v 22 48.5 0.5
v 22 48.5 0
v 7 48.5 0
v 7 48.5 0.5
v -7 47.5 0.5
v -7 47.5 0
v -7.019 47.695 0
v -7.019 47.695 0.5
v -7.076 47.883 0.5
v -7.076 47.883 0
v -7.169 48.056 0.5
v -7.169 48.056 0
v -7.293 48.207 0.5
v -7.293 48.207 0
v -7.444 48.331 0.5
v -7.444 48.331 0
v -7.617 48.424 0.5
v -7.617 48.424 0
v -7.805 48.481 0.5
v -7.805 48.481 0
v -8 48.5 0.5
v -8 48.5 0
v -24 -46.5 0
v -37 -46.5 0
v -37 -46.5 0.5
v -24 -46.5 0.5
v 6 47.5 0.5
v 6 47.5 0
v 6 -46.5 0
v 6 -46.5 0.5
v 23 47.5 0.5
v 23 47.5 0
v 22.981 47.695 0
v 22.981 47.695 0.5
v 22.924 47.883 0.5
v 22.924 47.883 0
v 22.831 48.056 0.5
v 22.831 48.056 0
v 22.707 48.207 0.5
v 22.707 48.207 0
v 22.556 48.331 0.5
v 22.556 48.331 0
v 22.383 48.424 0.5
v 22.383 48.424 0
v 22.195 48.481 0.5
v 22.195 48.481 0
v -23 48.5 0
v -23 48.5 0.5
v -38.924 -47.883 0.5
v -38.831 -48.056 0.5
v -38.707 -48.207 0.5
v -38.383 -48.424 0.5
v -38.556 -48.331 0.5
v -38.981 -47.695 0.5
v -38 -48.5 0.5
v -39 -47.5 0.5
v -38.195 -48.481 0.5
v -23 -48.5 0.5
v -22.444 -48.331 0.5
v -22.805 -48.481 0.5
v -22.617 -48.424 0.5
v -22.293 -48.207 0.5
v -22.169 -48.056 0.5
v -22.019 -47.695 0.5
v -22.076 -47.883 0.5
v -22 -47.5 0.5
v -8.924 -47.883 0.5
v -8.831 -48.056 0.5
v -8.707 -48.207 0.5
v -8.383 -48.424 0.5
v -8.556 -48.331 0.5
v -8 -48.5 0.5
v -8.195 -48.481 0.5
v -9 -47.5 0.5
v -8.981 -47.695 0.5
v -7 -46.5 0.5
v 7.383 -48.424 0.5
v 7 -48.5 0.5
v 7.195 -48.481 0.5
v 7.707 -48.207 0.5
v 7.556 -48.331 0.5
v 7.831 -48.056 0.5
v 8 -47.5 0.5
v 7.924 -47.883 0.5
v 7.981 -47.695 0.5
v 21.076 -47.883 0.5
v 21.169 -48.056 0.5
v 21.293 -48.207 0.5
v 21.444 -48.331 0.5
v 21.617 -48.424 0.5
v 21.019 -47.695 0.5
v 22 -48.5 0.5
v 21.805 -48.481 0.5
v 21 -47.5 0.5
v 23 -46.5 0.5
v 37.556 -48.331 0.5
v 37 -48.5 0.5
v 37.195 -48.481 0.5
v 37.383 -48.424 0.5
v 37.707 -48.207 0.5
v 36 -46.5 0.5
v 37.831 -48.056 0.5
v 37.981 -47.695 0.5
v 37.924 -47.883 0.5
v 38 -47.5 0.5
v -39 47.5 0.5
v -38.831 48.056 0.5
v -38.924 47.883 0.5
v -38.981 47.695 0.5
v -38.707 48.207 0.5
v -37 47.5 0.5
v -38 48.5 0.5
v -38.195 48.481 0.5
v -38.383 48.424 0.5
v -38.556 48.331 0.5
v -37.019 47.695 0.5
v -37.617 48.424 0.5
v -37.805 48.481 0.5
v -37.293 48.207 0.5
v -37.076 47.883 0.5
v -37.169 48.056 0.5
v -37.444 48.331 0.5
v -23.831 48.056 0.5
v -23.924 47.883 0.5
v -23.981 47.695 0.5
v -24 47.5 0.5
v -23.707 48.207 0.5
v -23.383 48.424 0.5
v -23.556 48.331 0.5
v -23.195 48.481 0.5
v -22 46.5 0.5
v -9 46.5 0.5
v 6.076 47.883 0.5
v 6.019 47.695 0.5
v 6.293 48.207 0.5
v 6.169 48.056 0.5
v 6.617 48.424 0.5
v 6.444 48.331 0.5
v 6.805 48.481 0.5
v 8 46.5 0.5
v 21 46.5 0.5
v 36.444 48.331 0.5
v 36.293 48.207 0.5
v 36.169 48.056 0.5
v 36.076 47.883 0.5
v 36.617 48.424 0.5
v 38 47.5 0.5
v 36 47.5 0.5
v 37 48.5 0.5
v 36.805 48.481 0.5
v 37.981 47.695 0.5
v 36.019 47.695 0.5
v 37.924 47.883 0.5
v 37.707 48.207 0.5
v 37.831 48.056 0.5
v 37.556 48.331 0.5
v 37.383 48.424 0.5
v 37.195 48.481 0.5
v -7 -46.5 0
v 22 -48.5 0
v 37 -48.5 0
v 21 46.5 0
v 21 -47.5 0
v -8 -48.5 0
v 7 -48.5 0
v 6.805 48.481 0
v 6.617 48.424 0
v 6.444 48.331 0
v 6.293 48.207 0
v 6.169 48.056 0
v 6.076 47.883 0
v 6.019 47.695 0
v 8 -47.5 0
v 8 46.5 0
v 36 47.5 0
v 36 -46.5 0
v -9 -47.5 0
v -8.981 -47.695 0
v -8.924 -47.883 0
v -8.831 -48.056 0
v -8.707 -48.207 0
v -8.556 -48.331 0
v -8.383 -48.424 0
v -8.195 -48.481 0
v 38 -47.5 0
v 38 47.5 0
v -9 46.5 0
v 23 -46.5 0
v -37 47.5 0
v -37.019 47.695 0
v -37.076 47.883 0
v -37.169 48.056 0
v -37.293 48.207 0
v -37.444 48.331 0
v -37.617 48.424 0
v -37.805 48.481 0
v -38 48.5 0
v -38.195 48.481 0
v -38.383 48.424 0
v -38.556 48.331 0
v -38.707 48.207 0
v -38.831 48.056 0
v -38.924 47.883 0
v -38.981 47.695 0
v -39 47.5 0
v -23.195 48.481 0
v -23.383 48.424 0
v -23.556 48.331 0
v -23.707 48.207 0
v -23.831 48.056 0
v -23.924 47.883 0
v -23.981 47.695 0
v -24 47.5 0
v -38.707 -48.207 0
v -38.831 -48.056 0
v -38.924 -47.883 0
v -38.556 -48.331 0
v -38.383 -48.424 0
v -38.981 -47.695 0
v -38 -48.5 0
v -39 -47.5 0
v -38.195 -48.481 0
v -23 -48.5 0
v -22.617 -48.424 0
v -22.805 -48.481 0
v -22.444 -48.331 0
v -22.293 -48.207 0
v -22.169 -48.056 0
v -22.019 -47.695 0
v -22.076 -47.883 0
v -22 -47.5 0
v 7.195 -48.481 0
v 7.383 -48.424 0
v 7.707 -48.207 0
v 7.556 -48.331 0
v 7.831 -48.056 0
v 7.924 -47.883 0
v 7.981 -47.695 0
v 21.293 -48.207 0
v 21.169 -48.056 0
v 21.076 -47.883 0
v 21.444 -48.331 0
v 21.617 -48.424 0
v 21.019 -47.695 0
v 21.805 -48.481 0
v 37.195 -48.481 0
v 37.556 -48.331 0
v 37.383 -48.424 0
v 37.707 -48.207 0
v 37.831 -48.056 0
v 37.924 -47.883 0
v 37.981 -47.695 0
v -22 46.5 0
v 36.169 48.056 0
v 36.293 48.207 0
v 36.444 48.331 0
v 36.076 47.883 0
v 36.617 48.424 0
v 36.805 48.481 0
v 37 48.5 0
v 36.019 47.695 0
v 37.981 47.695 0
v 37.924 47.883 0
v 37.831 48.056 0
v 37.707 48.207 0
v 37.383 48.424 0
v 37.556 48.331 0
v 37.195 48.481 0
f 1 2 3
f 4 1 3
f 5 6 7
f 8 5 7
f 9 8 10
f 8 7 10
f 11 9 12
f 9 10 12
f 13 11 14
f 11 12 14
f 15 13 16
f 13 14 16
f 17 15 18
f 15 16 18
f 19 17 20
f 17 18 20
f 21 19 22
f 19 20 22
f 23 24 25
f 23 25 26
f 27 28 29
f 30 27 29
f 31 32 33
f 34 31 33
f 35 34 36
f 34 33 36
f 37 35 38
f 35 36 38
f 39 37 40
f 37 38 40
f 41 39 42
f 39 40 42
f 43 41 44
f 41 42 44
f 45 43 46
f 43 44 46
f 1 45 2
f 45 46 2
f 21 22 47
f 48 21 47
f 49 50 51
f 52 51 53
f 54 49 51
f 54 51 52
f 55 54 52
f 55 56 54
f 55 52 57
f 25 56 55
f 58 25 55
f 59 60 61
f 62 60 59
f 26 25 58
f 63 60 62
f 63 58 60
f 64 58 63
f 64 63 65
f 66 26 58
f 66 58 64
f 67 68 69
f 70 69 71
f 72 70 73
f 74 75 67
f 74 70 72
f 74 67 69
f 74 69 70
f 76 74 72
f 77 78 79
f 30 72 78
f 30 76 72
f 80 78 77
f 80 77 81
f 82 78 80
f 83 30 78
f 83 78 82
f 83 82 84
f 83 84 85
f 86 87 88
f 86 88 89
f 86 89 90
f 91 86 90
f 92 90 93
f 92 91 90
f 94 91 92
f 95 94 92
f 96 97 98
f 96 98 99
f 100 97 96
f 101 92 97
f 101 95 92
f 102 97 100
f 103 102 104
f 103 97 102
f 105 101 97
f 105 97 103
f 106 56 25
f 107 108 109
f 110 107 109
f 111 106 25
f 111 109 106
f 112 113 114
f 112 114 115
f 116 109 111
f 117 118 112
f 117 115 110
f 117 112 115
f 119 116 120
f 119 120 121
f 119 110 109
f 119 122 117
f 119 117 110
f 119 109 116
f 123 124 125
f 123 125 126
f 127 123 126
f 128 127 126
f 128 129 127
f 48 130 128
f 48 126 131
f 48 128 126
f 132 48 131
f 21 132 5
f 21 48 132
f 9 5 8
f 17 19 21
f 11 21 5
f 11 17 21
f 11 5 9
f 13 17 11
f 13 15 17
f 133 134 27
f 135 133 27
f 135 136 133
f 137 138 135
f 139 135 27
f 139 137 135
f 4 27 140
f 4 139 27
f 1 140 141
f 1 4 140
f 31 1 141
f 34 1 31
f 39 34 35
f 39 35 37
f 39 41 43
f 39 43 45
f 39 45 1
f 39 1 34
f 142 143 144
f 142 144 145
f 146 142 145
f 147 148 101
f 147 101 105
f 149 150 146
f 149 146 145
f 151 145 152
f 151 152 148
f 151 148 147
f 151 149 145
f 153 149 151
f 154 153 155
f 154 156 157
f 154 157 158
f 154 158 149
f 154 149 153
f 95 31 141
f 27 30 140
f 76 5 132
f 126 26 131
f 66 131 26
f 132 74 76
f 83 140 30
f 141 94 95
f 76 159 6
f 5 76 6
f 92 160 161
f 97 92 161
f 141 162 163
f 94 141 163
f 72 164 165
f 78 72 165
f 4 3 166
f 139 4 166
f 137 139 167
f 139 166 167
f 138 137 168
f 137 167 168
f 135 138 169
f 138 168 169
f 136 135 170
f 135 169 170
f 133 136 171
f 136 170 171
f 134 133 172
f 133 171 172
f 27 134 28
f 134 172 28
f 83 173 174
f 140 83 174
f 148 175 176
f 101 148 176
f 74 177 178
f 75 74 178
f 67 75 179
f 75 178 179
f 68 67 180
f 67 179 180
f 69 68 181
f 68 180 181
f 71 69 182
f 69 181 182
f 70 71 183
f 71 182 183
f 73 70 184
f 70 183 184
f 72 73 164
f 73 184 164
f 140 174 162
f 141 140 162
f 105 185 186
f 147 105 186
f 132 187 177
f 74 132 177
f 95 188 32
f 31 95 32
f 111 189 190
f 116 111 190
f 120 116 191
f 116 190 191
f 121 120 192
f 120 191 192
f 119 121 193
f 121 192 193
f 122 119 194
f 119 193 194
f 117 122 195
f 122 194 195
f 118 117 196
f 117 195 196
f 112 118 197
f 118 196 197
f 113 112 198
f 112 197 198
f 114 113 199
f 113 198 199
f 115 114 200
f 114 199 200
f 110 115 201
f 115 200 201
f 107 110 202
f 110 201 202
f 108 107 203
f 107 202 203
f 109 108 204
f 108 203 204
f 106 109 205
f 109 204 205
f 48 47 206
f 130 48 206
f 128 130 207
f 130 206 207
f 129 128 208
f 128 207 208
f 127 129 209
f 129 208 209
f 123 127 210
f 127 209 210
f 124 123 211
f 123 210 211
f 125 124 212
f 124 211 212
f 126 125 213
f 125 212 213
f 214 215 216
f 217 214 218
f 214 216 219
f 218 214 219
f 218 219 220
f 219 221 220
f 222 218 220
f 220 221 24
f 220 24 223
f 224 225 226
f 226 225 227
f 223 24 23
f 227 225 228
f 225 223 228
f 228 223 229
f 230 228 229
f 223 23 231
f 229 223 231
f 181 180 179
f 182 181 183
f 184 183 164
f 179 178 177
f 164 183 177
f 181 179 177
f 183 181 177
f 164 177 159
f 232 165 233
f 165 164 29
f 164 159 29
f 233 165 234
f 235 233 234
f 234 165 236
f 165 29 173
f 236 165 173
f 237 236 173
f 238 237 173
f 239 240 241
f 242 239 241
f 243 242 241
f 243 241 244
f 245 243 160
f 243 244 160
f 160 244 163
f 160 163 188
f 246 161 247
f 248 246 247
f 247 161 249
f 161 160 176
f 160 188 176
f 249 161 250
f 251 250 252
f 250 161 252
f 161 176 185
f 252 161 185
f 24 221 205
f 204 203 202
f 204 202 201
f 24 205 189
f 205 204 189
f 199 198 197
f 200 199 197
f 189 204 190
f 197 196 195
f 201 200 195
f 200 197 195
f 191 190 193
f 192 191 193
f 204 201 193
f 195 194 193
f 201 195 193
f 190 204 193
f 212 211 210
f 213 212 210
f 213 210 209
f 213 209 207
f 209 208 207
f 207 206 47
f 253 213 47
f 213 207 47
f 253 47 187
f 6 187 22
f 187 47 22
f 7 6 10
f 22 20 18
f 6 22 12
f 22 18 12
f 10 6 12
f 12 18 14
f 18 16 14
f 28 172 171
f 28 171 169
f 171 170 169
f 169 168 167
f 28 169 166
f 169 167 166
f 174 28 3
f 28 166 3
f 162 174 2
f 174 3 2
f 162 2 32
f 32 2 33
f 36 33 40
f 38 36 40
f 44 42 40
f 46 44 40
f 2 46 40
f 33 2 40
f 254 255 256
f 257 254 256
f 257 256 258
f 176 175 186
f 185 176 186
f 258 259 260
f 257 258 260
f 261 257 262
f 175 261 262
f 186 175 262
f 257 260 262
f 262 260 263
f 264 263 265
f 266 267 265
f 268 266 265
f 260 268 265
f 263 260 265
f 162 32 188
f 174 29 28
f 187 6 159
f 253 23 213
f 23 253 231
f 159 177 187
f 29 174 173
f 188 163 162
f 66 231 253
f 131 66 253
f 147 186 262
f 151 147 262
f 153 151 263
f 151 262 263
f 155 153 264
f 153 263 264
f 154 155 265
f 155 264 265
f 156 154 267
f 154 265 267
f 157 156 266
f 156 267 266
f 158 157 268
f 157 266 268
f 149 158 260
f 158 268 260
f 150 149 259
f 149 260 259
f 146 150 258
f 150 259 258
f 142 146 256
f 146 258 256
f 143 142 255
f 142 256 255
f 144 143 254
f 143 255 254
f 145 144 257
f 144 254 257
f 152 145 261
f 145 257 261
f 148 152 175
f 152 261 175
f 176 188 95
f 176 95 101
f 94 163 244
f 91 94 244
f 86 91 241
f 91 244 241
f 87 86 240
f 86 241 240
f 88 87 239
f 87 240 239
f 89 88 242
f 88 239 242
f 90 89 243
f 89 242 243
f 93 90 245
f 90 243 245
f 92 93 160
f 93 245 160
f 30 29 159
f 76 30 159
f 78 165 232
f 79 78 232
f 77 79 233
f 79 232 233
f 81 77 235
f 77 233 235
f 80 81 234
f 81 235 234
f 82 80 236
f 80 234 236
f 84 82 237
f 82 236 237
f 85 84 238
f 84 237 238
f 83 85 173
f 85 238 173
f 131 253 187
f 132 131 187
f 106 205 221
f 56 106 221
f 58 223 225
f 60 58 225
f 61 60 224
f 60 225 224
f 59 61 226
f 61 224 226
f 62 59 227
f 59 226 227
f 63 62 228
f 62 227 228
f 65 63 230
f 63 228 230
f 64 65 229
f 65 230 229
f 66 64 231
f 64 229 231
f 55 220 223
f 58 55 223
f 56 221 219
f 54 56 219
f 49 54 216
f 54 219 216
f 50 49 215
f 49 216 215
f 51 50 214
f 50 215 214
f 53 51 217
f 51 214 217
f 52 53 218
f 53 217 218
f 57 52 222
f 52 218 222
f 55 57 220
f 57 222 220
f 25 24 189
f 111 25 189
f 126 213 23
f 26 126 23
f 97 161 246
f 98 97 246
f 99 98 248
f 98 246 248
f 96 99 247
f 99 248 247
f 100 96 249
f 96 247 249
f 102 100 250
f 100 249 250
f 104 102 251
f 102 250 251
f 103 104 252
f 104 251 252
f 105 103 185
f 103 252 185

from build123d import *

# Parameters (mm, degrees)
F1_W     = 1
F1_H     = 1
F1_W_2   = 13
F2_DEPTH = 0.5


with BuildPart() as f2:
    # F1 (on Top) → F2 (new body)
    with BuildSketch(Plane.XY):
        with BuildLine():
            ThreePointArc((38, -47.5), (37.7071067812, -46.7928932188), (37, -46.5))
            Line((37, -46.5), (37, -47.5))
            Line((37, -47.5), (36, -47.5))
            ThreePointArc((36, -47.5), (36.2928932188, -48.2071067812), (37, -48.5))
            ThreePointArc((37, -48.5), (37.7071067812, -48.2071067812), (38, -47.5))
        make_face()
        with BuildLine():
            Line((36, -46.5), (37, -46.5))
            ThreePointArc((37, -46.5), (37.7071067812, -46.7928932188), (38, -47.5))
            Line((38, -47.5), (38, 47.5))
            ThreePointArc((38, 47.5), (37, 48.5), (36, 47.5))
            Line((36, 47.5), (36, -46.5))
        make_face()
        with Locations((36.5, -47)):
            Rectangle(F1_W, F1_H)
        with Locations((29.5, -47)):
            Rectangle(F1_W_2, F1_H)
        with BuildLine():
            ThreePointArc((37, -48.5), (36.2928932188, -48.2071067812), (36, -47.5))
            Line((36, -47.5), (23, -47.5))
            ThreePointArc((23, -47.5), (22.7071067812, -48.2071067812), (22, -48.5))
            Line((22, -48.5), (37, -48.5))
        make_face()
        with BuildLine():
            Line((22, -46.5), (23, -46.5))
            Line((23, -46.5), (23, 47.5))
            ThreePointArc((23, 47.5), (22.7071067812, 46.7928932188), (22, 46.5))
            Line((22, 46.5), (22, -46.5))
        make_face()
        with Locations((22.5, -47)):
            Rectangle(F1_W, F1_H)
        with BuildLine():
            ThreePointArc((22, -48.5), (22.7071067812, -48.2071067812), (23, -47.5))
            Line((23, -47.5), (22, -47.5))
            Line((22, -47.5), (22, -46.5))
            ThreePointArc((22, -46.5), (21.2928932188, -46.7928932188), (21, -47.5))
            ThreePointArc((21, -47.5), (21.2928932188, -48.2071067812), (22, -48.5))
        make_face()
        with BuildLine():
            ThreePointArc((22, 46.5), (22.7071067812, 46.7928932188), (23, 47.5))
            ThreePointArc((23, 47.5), (22.7071067812, 48.2071067812), (22, 48.5))
            ThreePointArc((22, 48.5), (21.2928932188, 48.2071067812), (21, 47.5))
            Line((21, 47.5), (22, 47.5))
            Line((22, 47.5), (22, 46.5))
        make_face()
        with BuildLine():
            ThreePointArc((21, -47.5), (21.2928932188, -46.7928932188), (22, -46.5))
            Line((22, -46.5), (22, 46.5))
            Line((22, 46.5), (21, 46.5))
            Line((21, 46.5), (21, -47.5))
        make_face()
        with BuildLine():
            ThreePointArc((21, 47.5), (21.2928932188, 48.2071067812), (22, 48.5))
            Line((22, 48.5), (7, 48.5))
            ThreePointArc((7, 48.5), (7.7071067812, 48.2071067812), (8, 47.5))
            Line((8, 47.5), (21, 47.5))
        make_face()
        with Locations((21.5, 47)):
            Rectangle(F1_W, F1_H)
        with Locations((14.5, 47)):
            Rectangle(F1_W_2, F1_H)
        with BuildLine():
            ThreePointArc((8, 47.5), (7.7071067812, 48.2071067812), (7, 48.5))
            ThreePointArc((7, 48.5), (6.2928932188, 48.2071067812), (6, 47.5))
            ThreePointArc((6, 47.5), (6.2928932188, 46.7928932188), (7, 46.5))
            Line((7, 46.5), (7, 47.5))
            Line((7, 47.5), (8, 47.5))
        make_face()
        with BuildLine():
            Line((8, -47.5), (8, 46.5))
            Line((8, 46.5), (7, 46.5))
            Line((7, 46.5), (7, -46.5))
            ThreePointArc((7, -46.5), (7.7071067812, -46.7928932188), (8, -47.5))
        make_face()
        with Locations((7.5, 47)):
            Rectangle(F1_W, F1_H)
        with BuildLine():
            ThreePointArc((7, 46.5), (6.2928932188, 46.7928932188), (6, 47.5))
            Line((6, 47.5), (6, -46.5))
            Line((6, -46.5), (7, -46.5))
            Line((7, -46.5), (7, 46.5))
        make_face()
        with BuildLine():
            ThreePointArc((7, -48.5), (7.7071067812, -48.2071067812), (8, -47.5))
            ThreePointArc((8, -47.5), (7.7071067812, -46.7928932188), (7, -46.5))
            Line((7, -46.5), (7, -47.5))
            Line((7, -47.5), (6, -47.5))
            ThreePointArc((6, -47.5), (6.2928932188, -48.2071067812), (7, -48.5))
        make_face()
        with Locations((6.5, -47)):
            Rectangle(F1_W, F1_H)
        with Locations((-0.5, -47)):
            Rectangle(F1_W_2, F1_H)
        with BuildLine():
            Line((-8, -48.5), (7, -48.5))
            ThreePointArc((7, -48.5), (6.2928932188, -48.2071067812), (6, -47.5))
            Line((6, -47.5), (-7, -47.5))
            ThreePointArc((-7, -47.5), (-7.2928932188, -48.2071067812), (-8, -48.5))
        make_face()
        with Locations((-7.5, -47)):
            Rectangle(F1_W, F1_H)
        with BuildLine():
            Line((-8, -46.5), (-7, -46.5))
            Line((-7, -46.5), (-7, 47.5))
            ThreePointArc((-7, 47.5), (-7.2928932188, 46.7928932188), (-8, 46.5))
            Line((-8, 46.5), (-8, -46.5))
        make_face()
        with BuildLine():
            ThreePointArc((-9, -47.5), (-8.7071067812, -48.2071067812), (-8, -48.5))
            ThreePointArc((-8, -48.5), (-7.2928932188, -48.2071067812), (-7, -47.5))
            Line((-7, -47.5), (-8, -47.5))
            Line((-8, -47.5), (-8, -46.5))
            ThreePointArc((-8, -46.5), (-8.7071067812, -46.7928932188), (-9, -47.5))
        make_face()
        with BuildLine():
            ThreePointArc((-9, -47.5), (-8.7071067812, -46.7928932188), (-8, -46.5))
            Line((-8, -46.5), (-8, 46.5))
            Line((-8, 46.5), (-9, 46.5))
            Line((-9, 46.5), (-9, -47.5))
        make_face()
        with BuildLine():
            ThreePointArc((-8, 46.5), (-7.2928932188, 46.7928932188), (-7, 47.5))
            ThreePointArc((-7, 47.5), (-7.2928932188, 48.2071067812), (-8, 48.5))
            ThreePointArc((-8, 48.5), (-8.7071067812, 48.2071067812), (-9, 47.5))
            Line((-9, 47.5), (-8, 47.5))
            Line((-8, 47.5), (-8, 46.5))
        make_face()
        with Locations((-8.5, 47)):
            Rectangle(F1_W, F1_H)
        with BuildLine():
            ThreePointArc((-9, 47.5), (-8.7071067812, 48.2071067812), (-8, 48.5))
            Line((-8, 48.5), (-23, 48.5))
            ThreePointArc((-23, 48.5), (-22.2928932188, 48.2071067812), (-22, 47.5))
            Line((-22, 47.5), (-9, 47.5))
        make_face()
        with Locations((-15.5, 47)):
            Rectangle(F1_W_2, F1_H)
        with BuildLine():
            ThreePointArc((-22, 47.5), (-22.2928932188, 48.2071067812), (-23, 48.5))
            ThreePointArc((-23, 48.5), (-23.7071067812, 48.2071067812), (-24, 47.5))
            ThreePointArc((-24, 47.5), (-23.7071067812, 46.7928932188), (-23, 46.5))
            Line((-23, 46.5), (-23, 47.5))
            Line((-23, 47.5), (-22, 47.5))
        make_face()
        with Locations((-22.5, 47)):
            Rectangle(F1_W, F1_H)
        with BuildLine():
            Line((-22, -47.5), (-22, 46.5))
            Line((-22, 46.5), (-23, 46.5))
            Line((-23, 46.5), (-23, -46.5))
            ThreePointArc((-23, -46.5), (-22.2928932188, -46.7928932188), (-22, -47.5))
        make_face()
        with BuildLine():
            ThreePointArc((-23, 46.5), (-23.7071067812, 46.7928932188), (-24, 47.5))
            Line((-24, 47.5), (-24, -46.5))
            Line((-24, -46.5), (-23, -46.5))
            Line((-23, -46.5), (-23, 46.5))
        make_face()
        with BuildLine():
            ThreePointArc((-23, -48.5), (-22.2928932188, -48.2071067812), (-22, -47.5))
            ThreePointArc((-22, -47.5), (-22.2928932188, -46.7928932188), (-23, -46.5))
            Line((-23, -46.5), (-23, -47.5))
            Line((-23, -47.5), (-24, -47.5))
            ThreePointArc((-24, -47.5), (-23.7071067812, -48.2071067812), (-23, -48.5))
        make_face()
        with Locations((-30.5, -47)):
            Rectangle(F1_W_2, F1_H)
        with Locations((-23.5, -47)):
            Rectangle(F1_W, F1_H)
        with BuildLine():
            Line((-38, -48.5), (-23, -48.5))
            ThreePointArc((-23, -48.5), (-23.7071067812, -48.2071067812), (-24, -47.5))
            Line((-24, -47.5), (-37, -47.5))
            ThreePointArc((-37, -47.5), (-37.2928932188, -48.2071067812), (-38, -48.5))
        make_face()
        with BuildLine():
            Line((-38, -46.5), (-37, -46.5))
            Line((-37, -46.5), (-37, 47.5))
            ThreePointArc((-37, 47.5), (-38, 48.5), (-39, 47.5))
            Line((-39, 47.5), (-39, -47.5))
            ThreePointArc((-39, -47.5), (-38.7071067812, -46.7928932188), (-38, -46.5))
        make_face()
        with Locations((-37.5, -47)):
            Rectangle(F1_W, F1_H)
        with BuildLine():
            ThreePointArc((-39, -47.5), (-38.7071067812, -48.2071067812), (-38, -48.5))
            ThreePointArc((-38, -48.5), (-37.2928932188, -48.2071067812), (-37, -47.5))
            Line((-37, -47.5), (-38, -47.5))
            Line((-38, -47.5), (-38, -46.5))
            ThreePointArc((-38, -46.5), (-38.7071067812, -46.7928932188), (-39, -47.5))
        make_face()
    extrude(amount=F2_DEPTH)


solid = f2.part
